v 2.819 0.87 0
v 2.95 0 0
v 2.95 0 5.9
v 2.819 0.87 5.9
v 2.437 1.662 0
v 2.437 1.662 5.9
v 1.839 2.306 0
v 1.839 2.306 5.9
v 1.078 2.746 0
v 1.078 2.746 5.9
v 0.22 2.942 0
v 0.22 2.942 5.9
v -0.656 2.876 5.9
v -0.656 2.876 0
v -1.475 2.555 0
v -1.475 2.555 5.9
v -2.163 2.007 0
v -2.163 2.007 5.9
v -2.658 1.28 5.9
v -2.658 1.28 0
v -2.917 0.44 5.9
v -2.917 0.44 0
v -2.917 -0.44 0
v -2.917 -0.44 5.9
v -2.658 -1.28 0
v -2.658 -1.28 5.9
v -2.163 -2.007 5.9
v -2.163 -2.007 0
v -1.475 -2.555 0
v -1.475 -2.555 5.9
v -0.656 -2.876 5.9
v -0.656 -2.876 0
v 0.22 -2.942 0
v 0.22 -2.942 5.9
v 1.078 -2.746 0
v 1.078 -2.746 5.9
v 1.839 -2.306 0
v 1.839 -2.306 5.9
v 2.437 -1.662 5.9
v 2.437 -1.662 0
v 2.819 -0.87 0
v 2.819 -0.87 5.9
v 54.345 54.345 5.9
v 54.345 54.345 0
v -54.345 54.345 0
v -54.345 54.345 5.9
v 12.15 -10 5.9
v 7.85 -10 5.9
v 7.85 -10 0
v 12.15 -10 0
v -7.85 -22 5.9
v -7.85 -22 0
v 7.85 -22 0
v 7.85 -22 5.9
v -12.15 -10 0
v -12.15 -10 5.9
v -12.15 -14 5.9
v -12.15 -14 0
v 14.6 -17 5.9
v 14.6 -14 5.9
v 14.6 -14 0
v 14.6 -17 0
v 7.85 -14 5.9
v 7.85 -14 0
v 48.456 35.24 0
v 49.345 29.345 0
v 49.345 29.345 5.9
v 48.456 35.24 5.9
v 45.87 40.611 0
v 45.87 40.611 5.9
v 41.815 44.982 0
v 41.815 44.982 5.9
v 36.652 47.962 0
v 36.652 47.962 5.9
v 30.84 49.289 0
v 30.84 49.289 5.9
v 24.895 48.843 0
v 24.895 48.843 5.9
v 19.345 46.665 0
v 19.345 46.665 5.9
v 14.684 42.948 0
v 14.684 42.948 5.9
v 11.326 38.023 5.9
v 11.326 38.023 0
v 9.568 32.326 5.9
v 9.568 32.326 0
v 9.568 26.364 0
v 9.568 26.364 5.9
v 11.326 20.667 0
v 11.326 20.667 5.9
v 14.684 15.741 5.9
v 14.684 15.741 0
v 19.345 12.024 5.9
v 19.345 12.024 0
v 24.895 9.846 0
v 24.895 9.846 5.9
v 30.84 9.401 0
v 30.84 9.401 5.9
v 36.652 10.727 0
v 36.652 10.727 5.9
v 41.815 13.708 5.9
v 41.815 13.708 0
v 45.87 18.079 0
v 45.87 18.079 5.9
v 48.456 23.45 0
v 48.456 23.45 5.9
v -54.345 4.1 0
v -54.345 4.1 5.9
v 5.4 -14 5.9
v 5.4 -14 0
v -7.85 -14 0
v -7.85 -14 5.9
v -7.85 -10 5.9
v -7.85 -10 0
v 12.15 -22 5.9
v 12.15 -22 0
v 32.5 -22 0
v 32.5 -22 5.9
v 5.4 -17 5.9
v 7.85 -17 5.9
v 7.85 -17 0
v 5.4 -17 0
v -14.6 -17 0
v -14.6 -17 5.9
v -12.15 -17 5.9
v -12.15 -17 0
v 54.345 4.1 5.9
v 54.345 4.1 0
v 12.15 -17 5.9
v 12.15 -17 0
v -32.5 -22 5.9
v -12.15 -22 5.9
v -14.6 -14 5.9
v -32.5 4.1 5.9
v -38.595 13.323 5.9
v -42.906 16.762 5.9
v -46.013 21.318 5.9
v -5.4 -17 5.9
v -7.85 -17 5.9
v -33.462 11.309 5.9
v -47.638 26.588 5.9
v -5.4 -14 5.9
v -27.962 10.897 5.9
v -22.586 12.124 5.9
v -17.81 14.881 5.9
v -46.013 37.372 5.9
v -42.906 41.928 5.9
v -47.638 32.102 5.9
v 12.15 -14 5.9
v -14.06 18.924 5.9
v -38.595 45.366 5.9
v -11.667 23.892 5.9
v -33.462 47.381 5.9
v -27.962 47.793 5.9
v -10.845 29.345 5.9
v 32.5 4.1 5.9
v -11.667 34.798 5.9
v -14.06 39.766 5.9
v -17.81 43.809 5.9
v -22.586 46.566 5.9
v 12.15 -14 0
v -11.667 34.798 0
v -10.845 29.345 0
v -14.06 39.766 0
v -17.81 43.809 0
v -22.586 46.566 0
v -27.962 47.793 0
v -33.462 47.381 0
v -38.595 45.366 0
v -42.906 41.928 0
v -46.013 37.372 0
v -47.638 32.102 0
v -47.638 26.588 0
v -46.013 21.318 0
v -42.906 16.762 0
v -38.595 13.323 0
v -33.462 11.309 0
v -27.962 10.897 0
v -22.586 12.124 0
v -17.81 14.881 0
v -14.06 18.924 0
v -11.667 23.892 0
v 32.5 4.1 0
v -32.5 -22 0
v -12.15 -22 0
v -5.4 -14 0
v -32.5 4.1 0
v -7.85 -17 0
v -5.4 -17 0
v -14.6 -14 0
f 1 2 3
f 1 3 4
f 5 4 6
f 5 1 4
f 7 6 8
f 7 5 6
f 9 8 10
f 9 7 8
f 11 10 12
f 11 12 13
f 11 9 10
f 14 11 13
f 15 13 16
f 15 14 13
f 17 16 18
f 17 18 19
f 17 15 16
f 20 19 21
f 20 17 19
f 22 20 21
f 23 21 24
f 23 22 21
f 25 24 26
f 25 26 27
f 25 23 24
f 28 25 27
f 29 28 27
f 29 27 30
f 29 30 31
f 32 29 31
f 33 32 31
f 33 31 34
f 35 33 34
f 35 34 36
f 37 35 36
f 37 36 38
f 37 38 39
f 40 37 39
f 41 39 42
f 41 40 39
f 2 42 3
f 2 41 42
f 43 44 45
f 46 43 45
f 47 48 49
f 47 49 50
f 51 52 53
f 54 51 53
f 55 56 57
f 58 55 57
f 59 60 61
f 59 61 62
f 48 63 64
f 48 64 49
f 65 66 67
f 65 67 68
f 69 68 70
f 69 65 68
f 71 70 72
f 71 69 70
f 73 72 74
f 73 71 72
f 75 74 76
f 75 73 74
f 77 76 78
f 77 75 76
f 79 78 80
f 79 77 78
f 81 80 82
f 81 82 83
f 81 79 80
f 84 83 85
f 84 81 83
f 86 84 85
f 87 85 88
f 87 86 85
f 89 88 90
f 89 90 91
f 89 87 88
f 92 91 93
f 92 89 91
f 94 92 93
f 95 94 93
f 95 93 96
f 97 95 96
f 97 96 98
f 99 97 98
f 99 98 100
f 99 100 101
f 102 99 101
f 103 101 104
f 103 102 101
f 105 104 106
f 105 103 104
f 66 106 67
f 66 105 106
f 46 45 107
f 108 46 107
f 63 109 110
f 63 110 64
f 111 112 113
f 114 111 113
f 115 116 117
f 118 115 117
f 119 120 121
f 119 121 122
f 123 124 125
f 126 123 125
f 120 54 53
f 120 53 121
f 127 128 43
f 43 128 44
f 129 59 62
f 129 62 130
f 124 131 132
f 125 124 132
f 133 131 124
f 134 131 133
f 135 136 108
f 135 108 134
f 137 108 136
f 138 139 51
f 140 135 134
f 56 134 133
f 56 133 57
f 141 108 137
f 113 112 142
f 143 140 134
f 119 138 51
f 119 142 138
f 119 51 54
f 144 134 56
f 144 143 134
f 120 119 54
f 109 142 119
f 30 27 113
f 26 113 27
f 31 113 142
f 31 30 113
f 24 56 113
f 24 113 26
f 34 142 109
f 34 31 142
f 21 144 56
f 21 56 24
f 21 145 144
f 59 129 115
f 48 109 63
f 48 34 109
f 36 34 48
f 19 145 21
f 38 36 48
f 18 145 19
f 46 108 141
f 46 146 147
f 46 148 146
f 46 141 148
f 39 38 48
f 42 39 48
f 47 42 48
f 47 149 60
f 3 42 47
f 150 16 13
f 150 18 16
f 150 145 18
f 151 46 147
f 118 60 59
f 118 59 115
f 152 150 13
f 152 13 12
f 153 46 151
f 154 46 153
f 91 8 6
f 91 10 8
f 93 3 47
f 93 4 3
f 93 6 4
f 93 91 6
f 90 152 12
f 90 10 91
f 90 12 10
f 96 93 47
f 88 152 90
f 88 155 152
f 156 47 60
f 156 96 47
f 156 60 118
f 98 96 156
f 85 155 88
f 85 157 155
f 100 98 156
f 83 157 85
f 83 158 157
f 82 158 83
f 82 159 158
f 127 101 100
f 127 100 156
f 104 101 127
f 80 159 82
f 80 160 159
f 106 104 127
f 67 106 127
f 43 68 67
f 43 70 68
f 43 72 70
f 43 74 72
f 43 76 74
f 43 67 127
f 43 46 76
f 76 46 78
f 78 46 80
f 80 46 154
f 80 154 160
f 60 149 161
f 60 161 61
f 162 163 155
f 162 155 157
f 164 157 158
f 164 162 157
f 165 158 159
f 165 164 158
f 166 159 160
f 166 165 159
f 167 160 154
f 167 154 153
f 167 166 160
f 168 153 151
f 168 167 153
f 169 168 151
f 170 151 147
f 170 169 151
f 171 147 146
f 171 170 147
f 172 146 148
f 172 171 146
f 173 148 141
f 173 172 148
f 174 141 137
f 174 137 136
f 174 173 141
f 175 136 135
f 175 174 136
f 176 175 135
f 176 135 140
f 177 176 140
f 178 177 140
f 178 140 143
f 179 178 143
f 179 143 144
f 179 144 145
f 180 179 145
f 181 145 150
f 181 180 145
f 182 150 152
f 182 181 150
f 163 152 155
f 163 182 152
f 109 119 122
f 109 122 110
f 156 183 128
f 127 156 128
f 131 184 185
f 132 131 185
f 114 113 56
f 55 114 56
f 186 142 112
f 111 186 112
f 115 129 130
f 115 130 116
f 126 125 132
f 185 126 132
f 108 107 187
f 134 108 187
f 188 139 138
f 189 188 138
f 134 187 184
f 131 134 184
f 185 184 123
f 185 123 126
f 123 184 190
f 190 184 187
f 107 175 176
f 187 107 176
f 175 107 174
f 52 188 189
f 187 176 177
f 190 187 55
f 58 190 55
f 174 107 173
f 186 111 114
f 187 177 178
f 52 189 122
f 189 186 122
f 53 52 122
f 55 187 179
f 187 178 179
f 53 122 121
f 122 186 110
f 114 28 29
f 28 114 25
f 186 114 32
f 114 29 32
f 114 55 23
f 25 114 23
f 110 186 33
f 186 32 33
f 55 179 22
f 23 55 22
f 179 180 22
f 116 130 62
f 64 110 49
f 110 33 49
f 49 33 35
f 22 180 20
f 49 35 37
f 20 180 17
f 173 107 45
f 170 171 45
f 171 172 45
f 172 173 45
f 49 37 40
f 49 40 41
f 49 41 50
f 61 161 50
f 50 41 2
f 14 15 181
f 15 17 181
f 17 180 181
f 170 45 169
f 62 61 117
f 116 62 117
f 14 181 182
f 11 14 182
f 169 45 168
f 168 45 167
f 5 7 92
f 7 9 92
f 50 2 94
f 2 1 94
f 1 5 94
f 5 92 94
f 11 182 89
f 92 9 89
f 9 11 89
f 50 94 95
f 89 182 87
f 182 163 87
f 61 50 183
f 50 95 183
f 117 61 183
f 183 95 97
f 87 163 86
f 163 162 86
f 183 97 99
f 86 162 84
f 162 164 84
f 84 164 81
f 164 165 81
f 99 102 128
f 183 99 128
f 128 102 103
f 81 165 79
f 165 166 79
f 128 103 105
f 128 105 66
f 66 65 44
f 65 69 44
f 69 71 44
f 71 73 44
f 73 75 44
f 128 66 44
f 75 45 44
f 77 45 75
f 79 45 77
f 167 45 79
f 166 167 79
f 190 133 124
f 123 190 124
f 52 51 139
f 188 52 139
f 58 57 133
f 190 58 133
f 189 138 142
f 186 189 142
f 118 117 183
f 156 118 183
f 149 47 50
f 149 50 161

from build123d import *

# Parameters (mm, degrees)
SKETCH1_R           = 2.95
SKETCH1_R_2         = 20
SKETCH1_R_3         = 18.5
BOSS_EXTRUDE1_DEPTH = 5.9
CUT_EXTRUDE2_DEPTH  = 78.081470808


with BuildPart() as part:
    # Sketch1 → Boss-Extrude1 (new body)
    with BuildSketch(Plane.XY):
        Polygon((-32.5, 4.1), (-32.5, -22), (32.5, -22), (32.5, 4.1), (54.344931419, 4.1), (54.344931419, 54.344931419), (-54.344931419, 54.344931419), (-54.344931419, 4.1), align=None)
        Circle(SKETCH1_R, mode=Mode.SUBTRACT)
        with Locations((29.344931419, 29.344931419)):
            Circle(SKETCH1_R_2, mode=Mode.SUBTRACT)
        with Locations((-29.344931419, 29.344931419)):
            Circle(SKETCH1_R_3, mode=Mode.SUBTRACT)
    extrude(amount=BOSS_EXTRUDE1_DEPTH)

    # Sketch3 → Cut-Extrude2 (cut, through all)
    with BuildSketch(Plane.XY.offset(5.9)):
        Polygon((-12.15, -22), (-7.85, -22), (-7.85, -17), (-5.4, -17), (-5.4, -14), (-7.85, -14), (-7.85, -10), (-12.15, -10), (-12.15, -14), (-14.6, -14), (-14.6, -17), (-12.15, -17), align=None)
        Polygon((7.85, -14), (7.85, -10), (12.15, -10), (12.15, -14), (14.6, -14), (14.6, -17), (12.15, -17), (12.15, -22), (7.85, -22), (7.85, -17), (5.4, -17), (5.4, -14), align=None)
    extrude(amount=-CUT_EXTRUDE2_DEPTH, mode=Mode.SUBTRACT)


solid = part.part
